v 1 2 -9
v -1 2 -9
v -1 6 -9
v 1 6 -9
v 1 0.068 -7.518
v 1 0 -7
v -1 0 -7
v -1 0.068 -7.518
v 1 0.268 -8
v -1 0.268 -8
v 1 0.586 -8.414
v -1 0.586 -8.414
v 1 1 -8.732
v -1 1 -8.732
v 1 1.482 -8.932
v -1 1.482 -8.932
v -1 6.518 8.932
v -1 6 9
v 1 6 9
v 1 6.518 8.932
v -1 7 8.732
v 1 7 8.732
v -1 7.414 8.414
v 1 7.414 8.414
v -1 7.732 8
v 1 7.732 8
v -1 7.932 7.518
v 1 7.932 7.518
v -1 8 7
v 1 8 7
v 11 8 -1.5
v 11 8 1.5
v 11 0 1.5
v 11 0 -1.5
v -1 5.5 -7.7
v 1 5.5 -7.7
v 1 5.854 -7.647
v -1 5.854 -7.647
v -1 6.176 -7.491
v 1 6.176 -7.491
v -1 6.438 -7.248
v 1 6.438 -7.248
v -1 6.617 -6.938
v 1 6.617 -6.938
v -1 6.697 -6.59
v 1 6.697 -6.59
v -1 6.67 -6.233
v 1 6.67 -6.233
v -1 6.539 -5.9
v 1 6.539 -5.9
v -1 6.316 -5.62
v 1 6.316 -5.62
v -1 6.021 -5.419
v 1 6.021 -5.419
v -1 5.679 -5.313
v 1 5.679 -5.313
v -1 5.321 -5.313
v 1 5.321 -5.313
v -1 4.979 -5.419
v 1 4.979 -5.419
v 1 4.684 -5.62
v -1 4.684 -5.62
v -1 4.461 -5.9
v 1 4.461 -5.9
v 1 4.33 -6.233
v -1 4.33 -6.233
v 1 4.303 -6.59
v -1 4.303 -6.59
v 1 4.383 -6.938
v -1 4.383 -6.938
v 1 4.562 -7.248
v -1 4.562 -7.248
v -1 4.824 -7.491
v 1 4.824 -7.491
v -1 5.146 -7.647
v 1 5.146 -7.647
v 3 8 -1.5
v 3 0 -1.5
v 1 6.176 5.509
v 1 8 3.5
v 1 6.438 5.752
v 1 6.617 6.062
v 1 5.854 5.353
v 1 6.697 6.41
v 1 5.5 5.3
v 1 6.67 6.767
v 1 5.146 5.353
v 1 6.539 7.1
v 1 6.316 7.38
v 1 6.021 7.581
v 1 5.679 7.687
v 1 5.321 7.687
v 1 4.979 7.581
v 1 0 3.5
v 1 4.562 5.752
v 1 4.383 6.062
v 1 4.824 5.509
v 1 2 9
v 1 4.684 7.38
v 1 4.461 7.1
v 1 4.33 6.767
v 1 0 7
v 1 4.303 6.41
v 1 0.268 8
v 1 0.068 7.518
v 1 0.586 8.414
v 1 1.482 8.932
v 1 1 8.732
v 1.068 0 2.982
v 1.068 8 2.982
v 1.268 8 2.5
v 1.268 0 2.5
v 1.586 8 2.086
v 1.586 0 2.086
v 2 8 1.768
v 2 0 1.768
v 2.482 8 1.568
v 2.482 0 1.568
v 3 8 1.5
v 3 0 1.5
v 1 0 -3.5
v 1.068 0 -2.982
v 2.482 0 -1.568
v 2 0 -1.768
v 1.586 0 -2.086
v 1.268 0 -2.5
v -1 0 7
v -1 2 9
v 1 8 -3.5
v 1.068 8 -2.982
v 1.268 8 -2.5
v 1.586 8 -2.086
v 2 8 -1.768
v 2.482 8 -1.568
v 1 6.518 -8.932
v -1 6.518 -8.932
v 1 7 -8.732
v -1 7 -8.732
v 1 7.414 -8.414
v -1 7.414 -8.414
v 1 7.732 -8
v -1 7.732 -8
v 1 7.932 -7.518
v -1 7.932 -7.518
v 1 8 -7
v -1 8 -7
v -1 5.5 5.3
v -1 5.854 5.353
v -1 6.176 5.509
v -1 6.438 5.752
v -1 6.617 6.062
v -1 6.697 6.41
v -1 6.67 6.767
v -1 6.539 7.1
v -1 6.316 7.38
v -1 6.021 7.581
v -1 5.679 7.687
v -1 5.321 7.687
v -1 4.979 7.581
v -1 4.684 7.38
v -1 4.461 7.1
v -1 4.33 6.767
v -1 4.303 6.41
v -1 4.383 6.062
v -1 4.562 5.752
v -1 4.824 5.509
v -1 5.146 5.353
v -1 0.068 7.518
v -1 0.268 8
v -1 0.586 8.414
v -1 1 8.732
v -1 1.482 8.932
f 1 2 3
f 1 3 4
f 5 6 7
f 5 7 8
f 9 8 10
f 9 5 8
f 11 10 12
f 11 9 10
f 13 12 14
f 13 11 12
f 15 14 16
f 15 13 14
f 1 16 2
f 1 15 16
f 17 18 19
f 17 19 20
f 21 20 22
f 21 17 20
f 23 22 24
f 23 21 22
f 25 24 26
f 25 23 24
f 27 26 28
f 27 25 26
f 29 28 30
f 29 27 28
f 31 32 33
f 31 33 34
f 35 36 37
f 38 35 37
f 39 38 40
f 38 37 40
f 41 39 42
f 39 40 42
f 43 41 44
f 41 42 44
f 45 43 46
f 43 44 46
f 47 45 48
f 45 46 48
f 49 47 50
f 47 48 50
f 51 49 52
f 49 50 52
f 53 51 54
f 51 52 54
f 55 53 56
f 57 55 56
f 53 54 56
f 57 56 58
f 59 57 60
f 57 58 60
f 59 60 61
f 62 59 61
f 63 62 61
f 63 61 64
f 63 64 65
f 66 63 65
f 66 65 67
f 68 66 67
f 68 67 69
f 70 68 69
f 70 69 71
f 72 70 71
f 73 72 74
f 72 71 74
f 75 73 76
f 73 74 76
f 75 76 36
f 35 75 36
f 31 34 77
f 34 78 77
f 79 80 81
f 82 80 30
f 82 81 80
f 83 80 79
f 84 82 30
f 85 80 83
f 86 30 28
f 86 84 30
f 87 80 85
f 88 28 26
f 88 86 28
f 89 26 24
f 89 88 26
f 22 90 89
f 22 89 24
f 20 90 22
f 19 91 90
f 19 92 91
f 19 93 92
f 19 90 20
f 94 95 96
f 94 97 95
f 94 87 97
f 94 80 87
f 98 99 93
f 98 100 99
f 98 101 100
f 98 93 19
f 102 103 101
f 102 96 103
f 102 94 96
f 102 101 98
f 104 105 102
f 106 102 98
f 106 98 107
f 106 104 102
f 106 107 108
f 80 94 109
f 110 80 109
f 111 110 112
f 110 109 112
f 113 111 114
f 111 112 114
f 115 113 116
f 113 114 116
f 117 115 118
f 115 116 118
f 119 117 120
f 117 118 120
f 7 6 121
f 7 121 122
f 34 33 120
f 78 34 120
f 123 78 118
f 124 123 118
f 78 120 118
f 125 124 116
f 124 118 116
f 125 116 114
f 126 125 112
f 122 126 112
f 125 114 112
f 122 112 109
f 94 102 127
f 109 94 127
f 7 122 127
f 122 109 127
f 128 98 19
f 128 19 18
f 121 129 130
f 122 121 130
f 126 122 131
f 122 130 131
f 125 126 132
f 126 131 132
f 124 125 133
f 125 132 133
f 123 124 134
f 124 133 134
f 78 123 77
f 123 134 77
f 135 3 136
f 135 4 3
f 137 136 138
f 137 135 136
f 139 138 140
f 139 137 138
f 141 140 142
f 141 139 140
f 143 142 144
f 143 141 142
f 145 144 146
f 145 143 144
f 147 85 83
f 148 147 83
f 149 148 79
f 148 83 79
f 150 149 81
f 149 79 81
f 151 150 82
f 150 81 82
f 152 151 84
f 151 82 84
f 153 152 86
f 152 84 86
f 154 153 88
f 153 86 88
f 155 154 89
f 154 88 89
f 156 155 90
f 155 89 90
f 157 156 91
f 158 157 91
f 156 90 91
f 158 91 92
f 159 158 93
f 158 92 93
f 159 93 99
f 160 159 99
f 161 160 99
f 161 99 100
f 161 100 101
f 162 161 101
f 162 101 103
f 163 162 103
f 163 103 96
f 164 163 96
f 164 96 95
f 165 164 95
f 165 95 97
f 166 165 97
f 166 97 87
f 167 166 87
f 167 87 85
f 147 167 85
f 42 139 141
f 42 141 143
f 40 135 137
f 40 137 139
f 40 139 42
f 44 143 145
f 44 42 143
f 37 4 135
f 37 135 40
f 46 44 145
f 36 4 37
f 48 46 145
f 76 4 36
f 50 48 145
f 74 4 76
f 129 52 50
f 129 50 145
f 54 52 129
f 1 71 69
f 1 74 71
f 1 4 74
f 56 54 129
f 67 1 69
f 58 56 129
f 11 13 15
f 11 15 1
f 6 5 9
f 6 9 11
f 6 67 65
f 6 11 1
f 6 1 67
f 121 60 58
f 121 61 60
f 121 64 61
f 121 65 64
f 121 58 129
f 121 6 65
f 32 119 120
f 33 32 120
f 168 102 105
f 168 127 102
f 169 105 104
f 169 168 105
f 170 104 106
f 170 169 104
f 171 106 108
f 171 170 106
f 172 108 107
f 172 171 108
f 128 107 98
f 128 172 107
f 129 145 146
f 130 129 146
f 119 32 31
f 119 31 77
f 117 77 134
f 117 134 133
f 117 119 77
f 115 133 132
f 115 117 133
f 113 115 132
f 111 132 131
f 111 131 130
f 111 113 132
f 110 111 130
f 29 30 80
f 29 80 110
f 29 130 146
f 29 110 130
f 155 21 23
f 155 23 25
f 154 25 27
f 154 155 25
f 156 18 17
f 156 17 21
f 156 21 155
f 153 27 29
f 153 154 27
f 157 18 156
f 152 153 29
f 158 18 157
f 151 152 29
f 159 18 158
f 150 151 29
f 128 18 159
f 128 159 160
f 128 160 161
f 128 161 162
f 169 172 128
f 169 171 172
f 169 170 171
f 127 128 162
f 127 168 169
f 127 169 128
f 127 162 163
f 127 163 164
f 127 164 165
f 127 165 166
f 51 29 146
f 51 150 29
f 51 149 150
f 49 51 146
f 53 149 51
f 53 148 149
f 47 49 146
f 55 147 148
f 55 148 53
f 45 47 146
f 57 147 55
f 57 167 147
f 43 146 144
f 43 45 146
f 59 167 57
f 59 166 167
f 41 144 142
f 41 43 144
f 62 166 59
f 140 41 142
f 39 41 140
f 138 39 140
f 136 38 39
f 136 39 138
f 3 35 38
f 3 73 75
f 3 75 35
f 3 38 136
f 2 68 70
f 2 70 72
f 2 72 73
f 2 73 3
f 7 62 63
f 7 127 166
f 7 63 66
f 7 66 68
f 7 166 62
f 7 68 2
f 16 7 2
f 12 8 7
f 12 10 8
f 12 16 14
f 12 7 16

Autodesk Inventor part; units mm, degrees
ref_plane "YZ Plane" through (0, 0, 0) normal (1, 0, 0) x (0, 1, 0)
ref_plane "XZ Plane" through (0, 0, 0) normal (0, 1, 0) x (-1, 0, 0)
ref_plane "XY Plane" through (0, 0, 0) normal (0, 0, 1) x (1, 0, 0)
sketch "Sketch1" plane through (0, 0, 0) normal (0, 1, 0) x (-1, 0, 0)
  line L0 (-1, 9) -> (1, 9)
  line L1 (1, 9) -> (1, -9)
  line L2 (1, -9) -> (-1, -9)
  line L3 (-1, -9) -> (-1, 9)
  line L4 (-1, 9) -> (1, -9) construction
  line L5 (1, 9) -> (-1, -9) construction
  point P0 (0, 0)
  dimension "d0" = 18
  dimension "d1" = 2
extrude "Extrusion1" add sketch "Sketch1" along normal blind 8
fillet "Fillet1" radius 2 2 edges at (0, 8, 9) (0, 8, -9)
sketch "Sketch2" plane through (1, 0, 9) normal (1, 0, 0) x (0, 0, -1)
  circle A0 centre (2.5, 5.5) radius 1.2
  circle A1 centre (15.5, 5.5) radius 1.2
  line L0 (2, 8) -> (16, 8) projected
  line L1 (18, 0) -> (18, 6) projected
  line L2 (0, 0) -> (0, 6) projected
  point P0 (9, 0)
  point P1 (0, 3)
  dimension "d5" = 2.4
  dimension "d6" = 2.4
  dimension "d7" = 2.5
  dimension "d8" = 2.5
  dimension "d9" = 2.5
  dimension "d10" = 2.5
extrude "Extrusion2" cut sketch "Sketch2" against normal blind 2
fillet "Fillet2" radius 2 2 edges at (0, 0, 9) (0, 0, -9)
sketch "Sketch5" plane through (1, 8, 7) normal (1, 0, 0) x (0, 0, -1)
  line L0 (5.5, -8) -> (8.5, -8)
  line L1 (8.5, -8) -> (8.5, 0)
  line L2 (8.5, 0) -> (5.5, 0)
  line L3 (5.5, 0) -> (5.5, -8)
  line L4 (5.5, -8) -> (8.5, 0) construction
  line L5 (8.5, -8) -> (5.5, 0) construction
  line L6 (0, 0) -> (14, 0) projected
  line L7 (0, -8) -> (14, -8) projected
  line L8 (7, 0) -> (7, -8) construction
  line L9 (-2, -6) -> (-2, -2) projected
  line L10 (-2, -4) -> (16, -4) construction
  line L11 (16, -6) -> (16, -2) projected
  point P0 (7, -4)
  dimension "d14" = 3
extrude "Extrusion3" add sketch "Sketch5" along normal blind 10
fillet "Face Fillet1" radius 2 1 edges at (1, 4, 1.5)
fillet "Face Fillet2" radius 2 1 edges at (1, 4, -1.5)
properties part number "Uchwyt"
